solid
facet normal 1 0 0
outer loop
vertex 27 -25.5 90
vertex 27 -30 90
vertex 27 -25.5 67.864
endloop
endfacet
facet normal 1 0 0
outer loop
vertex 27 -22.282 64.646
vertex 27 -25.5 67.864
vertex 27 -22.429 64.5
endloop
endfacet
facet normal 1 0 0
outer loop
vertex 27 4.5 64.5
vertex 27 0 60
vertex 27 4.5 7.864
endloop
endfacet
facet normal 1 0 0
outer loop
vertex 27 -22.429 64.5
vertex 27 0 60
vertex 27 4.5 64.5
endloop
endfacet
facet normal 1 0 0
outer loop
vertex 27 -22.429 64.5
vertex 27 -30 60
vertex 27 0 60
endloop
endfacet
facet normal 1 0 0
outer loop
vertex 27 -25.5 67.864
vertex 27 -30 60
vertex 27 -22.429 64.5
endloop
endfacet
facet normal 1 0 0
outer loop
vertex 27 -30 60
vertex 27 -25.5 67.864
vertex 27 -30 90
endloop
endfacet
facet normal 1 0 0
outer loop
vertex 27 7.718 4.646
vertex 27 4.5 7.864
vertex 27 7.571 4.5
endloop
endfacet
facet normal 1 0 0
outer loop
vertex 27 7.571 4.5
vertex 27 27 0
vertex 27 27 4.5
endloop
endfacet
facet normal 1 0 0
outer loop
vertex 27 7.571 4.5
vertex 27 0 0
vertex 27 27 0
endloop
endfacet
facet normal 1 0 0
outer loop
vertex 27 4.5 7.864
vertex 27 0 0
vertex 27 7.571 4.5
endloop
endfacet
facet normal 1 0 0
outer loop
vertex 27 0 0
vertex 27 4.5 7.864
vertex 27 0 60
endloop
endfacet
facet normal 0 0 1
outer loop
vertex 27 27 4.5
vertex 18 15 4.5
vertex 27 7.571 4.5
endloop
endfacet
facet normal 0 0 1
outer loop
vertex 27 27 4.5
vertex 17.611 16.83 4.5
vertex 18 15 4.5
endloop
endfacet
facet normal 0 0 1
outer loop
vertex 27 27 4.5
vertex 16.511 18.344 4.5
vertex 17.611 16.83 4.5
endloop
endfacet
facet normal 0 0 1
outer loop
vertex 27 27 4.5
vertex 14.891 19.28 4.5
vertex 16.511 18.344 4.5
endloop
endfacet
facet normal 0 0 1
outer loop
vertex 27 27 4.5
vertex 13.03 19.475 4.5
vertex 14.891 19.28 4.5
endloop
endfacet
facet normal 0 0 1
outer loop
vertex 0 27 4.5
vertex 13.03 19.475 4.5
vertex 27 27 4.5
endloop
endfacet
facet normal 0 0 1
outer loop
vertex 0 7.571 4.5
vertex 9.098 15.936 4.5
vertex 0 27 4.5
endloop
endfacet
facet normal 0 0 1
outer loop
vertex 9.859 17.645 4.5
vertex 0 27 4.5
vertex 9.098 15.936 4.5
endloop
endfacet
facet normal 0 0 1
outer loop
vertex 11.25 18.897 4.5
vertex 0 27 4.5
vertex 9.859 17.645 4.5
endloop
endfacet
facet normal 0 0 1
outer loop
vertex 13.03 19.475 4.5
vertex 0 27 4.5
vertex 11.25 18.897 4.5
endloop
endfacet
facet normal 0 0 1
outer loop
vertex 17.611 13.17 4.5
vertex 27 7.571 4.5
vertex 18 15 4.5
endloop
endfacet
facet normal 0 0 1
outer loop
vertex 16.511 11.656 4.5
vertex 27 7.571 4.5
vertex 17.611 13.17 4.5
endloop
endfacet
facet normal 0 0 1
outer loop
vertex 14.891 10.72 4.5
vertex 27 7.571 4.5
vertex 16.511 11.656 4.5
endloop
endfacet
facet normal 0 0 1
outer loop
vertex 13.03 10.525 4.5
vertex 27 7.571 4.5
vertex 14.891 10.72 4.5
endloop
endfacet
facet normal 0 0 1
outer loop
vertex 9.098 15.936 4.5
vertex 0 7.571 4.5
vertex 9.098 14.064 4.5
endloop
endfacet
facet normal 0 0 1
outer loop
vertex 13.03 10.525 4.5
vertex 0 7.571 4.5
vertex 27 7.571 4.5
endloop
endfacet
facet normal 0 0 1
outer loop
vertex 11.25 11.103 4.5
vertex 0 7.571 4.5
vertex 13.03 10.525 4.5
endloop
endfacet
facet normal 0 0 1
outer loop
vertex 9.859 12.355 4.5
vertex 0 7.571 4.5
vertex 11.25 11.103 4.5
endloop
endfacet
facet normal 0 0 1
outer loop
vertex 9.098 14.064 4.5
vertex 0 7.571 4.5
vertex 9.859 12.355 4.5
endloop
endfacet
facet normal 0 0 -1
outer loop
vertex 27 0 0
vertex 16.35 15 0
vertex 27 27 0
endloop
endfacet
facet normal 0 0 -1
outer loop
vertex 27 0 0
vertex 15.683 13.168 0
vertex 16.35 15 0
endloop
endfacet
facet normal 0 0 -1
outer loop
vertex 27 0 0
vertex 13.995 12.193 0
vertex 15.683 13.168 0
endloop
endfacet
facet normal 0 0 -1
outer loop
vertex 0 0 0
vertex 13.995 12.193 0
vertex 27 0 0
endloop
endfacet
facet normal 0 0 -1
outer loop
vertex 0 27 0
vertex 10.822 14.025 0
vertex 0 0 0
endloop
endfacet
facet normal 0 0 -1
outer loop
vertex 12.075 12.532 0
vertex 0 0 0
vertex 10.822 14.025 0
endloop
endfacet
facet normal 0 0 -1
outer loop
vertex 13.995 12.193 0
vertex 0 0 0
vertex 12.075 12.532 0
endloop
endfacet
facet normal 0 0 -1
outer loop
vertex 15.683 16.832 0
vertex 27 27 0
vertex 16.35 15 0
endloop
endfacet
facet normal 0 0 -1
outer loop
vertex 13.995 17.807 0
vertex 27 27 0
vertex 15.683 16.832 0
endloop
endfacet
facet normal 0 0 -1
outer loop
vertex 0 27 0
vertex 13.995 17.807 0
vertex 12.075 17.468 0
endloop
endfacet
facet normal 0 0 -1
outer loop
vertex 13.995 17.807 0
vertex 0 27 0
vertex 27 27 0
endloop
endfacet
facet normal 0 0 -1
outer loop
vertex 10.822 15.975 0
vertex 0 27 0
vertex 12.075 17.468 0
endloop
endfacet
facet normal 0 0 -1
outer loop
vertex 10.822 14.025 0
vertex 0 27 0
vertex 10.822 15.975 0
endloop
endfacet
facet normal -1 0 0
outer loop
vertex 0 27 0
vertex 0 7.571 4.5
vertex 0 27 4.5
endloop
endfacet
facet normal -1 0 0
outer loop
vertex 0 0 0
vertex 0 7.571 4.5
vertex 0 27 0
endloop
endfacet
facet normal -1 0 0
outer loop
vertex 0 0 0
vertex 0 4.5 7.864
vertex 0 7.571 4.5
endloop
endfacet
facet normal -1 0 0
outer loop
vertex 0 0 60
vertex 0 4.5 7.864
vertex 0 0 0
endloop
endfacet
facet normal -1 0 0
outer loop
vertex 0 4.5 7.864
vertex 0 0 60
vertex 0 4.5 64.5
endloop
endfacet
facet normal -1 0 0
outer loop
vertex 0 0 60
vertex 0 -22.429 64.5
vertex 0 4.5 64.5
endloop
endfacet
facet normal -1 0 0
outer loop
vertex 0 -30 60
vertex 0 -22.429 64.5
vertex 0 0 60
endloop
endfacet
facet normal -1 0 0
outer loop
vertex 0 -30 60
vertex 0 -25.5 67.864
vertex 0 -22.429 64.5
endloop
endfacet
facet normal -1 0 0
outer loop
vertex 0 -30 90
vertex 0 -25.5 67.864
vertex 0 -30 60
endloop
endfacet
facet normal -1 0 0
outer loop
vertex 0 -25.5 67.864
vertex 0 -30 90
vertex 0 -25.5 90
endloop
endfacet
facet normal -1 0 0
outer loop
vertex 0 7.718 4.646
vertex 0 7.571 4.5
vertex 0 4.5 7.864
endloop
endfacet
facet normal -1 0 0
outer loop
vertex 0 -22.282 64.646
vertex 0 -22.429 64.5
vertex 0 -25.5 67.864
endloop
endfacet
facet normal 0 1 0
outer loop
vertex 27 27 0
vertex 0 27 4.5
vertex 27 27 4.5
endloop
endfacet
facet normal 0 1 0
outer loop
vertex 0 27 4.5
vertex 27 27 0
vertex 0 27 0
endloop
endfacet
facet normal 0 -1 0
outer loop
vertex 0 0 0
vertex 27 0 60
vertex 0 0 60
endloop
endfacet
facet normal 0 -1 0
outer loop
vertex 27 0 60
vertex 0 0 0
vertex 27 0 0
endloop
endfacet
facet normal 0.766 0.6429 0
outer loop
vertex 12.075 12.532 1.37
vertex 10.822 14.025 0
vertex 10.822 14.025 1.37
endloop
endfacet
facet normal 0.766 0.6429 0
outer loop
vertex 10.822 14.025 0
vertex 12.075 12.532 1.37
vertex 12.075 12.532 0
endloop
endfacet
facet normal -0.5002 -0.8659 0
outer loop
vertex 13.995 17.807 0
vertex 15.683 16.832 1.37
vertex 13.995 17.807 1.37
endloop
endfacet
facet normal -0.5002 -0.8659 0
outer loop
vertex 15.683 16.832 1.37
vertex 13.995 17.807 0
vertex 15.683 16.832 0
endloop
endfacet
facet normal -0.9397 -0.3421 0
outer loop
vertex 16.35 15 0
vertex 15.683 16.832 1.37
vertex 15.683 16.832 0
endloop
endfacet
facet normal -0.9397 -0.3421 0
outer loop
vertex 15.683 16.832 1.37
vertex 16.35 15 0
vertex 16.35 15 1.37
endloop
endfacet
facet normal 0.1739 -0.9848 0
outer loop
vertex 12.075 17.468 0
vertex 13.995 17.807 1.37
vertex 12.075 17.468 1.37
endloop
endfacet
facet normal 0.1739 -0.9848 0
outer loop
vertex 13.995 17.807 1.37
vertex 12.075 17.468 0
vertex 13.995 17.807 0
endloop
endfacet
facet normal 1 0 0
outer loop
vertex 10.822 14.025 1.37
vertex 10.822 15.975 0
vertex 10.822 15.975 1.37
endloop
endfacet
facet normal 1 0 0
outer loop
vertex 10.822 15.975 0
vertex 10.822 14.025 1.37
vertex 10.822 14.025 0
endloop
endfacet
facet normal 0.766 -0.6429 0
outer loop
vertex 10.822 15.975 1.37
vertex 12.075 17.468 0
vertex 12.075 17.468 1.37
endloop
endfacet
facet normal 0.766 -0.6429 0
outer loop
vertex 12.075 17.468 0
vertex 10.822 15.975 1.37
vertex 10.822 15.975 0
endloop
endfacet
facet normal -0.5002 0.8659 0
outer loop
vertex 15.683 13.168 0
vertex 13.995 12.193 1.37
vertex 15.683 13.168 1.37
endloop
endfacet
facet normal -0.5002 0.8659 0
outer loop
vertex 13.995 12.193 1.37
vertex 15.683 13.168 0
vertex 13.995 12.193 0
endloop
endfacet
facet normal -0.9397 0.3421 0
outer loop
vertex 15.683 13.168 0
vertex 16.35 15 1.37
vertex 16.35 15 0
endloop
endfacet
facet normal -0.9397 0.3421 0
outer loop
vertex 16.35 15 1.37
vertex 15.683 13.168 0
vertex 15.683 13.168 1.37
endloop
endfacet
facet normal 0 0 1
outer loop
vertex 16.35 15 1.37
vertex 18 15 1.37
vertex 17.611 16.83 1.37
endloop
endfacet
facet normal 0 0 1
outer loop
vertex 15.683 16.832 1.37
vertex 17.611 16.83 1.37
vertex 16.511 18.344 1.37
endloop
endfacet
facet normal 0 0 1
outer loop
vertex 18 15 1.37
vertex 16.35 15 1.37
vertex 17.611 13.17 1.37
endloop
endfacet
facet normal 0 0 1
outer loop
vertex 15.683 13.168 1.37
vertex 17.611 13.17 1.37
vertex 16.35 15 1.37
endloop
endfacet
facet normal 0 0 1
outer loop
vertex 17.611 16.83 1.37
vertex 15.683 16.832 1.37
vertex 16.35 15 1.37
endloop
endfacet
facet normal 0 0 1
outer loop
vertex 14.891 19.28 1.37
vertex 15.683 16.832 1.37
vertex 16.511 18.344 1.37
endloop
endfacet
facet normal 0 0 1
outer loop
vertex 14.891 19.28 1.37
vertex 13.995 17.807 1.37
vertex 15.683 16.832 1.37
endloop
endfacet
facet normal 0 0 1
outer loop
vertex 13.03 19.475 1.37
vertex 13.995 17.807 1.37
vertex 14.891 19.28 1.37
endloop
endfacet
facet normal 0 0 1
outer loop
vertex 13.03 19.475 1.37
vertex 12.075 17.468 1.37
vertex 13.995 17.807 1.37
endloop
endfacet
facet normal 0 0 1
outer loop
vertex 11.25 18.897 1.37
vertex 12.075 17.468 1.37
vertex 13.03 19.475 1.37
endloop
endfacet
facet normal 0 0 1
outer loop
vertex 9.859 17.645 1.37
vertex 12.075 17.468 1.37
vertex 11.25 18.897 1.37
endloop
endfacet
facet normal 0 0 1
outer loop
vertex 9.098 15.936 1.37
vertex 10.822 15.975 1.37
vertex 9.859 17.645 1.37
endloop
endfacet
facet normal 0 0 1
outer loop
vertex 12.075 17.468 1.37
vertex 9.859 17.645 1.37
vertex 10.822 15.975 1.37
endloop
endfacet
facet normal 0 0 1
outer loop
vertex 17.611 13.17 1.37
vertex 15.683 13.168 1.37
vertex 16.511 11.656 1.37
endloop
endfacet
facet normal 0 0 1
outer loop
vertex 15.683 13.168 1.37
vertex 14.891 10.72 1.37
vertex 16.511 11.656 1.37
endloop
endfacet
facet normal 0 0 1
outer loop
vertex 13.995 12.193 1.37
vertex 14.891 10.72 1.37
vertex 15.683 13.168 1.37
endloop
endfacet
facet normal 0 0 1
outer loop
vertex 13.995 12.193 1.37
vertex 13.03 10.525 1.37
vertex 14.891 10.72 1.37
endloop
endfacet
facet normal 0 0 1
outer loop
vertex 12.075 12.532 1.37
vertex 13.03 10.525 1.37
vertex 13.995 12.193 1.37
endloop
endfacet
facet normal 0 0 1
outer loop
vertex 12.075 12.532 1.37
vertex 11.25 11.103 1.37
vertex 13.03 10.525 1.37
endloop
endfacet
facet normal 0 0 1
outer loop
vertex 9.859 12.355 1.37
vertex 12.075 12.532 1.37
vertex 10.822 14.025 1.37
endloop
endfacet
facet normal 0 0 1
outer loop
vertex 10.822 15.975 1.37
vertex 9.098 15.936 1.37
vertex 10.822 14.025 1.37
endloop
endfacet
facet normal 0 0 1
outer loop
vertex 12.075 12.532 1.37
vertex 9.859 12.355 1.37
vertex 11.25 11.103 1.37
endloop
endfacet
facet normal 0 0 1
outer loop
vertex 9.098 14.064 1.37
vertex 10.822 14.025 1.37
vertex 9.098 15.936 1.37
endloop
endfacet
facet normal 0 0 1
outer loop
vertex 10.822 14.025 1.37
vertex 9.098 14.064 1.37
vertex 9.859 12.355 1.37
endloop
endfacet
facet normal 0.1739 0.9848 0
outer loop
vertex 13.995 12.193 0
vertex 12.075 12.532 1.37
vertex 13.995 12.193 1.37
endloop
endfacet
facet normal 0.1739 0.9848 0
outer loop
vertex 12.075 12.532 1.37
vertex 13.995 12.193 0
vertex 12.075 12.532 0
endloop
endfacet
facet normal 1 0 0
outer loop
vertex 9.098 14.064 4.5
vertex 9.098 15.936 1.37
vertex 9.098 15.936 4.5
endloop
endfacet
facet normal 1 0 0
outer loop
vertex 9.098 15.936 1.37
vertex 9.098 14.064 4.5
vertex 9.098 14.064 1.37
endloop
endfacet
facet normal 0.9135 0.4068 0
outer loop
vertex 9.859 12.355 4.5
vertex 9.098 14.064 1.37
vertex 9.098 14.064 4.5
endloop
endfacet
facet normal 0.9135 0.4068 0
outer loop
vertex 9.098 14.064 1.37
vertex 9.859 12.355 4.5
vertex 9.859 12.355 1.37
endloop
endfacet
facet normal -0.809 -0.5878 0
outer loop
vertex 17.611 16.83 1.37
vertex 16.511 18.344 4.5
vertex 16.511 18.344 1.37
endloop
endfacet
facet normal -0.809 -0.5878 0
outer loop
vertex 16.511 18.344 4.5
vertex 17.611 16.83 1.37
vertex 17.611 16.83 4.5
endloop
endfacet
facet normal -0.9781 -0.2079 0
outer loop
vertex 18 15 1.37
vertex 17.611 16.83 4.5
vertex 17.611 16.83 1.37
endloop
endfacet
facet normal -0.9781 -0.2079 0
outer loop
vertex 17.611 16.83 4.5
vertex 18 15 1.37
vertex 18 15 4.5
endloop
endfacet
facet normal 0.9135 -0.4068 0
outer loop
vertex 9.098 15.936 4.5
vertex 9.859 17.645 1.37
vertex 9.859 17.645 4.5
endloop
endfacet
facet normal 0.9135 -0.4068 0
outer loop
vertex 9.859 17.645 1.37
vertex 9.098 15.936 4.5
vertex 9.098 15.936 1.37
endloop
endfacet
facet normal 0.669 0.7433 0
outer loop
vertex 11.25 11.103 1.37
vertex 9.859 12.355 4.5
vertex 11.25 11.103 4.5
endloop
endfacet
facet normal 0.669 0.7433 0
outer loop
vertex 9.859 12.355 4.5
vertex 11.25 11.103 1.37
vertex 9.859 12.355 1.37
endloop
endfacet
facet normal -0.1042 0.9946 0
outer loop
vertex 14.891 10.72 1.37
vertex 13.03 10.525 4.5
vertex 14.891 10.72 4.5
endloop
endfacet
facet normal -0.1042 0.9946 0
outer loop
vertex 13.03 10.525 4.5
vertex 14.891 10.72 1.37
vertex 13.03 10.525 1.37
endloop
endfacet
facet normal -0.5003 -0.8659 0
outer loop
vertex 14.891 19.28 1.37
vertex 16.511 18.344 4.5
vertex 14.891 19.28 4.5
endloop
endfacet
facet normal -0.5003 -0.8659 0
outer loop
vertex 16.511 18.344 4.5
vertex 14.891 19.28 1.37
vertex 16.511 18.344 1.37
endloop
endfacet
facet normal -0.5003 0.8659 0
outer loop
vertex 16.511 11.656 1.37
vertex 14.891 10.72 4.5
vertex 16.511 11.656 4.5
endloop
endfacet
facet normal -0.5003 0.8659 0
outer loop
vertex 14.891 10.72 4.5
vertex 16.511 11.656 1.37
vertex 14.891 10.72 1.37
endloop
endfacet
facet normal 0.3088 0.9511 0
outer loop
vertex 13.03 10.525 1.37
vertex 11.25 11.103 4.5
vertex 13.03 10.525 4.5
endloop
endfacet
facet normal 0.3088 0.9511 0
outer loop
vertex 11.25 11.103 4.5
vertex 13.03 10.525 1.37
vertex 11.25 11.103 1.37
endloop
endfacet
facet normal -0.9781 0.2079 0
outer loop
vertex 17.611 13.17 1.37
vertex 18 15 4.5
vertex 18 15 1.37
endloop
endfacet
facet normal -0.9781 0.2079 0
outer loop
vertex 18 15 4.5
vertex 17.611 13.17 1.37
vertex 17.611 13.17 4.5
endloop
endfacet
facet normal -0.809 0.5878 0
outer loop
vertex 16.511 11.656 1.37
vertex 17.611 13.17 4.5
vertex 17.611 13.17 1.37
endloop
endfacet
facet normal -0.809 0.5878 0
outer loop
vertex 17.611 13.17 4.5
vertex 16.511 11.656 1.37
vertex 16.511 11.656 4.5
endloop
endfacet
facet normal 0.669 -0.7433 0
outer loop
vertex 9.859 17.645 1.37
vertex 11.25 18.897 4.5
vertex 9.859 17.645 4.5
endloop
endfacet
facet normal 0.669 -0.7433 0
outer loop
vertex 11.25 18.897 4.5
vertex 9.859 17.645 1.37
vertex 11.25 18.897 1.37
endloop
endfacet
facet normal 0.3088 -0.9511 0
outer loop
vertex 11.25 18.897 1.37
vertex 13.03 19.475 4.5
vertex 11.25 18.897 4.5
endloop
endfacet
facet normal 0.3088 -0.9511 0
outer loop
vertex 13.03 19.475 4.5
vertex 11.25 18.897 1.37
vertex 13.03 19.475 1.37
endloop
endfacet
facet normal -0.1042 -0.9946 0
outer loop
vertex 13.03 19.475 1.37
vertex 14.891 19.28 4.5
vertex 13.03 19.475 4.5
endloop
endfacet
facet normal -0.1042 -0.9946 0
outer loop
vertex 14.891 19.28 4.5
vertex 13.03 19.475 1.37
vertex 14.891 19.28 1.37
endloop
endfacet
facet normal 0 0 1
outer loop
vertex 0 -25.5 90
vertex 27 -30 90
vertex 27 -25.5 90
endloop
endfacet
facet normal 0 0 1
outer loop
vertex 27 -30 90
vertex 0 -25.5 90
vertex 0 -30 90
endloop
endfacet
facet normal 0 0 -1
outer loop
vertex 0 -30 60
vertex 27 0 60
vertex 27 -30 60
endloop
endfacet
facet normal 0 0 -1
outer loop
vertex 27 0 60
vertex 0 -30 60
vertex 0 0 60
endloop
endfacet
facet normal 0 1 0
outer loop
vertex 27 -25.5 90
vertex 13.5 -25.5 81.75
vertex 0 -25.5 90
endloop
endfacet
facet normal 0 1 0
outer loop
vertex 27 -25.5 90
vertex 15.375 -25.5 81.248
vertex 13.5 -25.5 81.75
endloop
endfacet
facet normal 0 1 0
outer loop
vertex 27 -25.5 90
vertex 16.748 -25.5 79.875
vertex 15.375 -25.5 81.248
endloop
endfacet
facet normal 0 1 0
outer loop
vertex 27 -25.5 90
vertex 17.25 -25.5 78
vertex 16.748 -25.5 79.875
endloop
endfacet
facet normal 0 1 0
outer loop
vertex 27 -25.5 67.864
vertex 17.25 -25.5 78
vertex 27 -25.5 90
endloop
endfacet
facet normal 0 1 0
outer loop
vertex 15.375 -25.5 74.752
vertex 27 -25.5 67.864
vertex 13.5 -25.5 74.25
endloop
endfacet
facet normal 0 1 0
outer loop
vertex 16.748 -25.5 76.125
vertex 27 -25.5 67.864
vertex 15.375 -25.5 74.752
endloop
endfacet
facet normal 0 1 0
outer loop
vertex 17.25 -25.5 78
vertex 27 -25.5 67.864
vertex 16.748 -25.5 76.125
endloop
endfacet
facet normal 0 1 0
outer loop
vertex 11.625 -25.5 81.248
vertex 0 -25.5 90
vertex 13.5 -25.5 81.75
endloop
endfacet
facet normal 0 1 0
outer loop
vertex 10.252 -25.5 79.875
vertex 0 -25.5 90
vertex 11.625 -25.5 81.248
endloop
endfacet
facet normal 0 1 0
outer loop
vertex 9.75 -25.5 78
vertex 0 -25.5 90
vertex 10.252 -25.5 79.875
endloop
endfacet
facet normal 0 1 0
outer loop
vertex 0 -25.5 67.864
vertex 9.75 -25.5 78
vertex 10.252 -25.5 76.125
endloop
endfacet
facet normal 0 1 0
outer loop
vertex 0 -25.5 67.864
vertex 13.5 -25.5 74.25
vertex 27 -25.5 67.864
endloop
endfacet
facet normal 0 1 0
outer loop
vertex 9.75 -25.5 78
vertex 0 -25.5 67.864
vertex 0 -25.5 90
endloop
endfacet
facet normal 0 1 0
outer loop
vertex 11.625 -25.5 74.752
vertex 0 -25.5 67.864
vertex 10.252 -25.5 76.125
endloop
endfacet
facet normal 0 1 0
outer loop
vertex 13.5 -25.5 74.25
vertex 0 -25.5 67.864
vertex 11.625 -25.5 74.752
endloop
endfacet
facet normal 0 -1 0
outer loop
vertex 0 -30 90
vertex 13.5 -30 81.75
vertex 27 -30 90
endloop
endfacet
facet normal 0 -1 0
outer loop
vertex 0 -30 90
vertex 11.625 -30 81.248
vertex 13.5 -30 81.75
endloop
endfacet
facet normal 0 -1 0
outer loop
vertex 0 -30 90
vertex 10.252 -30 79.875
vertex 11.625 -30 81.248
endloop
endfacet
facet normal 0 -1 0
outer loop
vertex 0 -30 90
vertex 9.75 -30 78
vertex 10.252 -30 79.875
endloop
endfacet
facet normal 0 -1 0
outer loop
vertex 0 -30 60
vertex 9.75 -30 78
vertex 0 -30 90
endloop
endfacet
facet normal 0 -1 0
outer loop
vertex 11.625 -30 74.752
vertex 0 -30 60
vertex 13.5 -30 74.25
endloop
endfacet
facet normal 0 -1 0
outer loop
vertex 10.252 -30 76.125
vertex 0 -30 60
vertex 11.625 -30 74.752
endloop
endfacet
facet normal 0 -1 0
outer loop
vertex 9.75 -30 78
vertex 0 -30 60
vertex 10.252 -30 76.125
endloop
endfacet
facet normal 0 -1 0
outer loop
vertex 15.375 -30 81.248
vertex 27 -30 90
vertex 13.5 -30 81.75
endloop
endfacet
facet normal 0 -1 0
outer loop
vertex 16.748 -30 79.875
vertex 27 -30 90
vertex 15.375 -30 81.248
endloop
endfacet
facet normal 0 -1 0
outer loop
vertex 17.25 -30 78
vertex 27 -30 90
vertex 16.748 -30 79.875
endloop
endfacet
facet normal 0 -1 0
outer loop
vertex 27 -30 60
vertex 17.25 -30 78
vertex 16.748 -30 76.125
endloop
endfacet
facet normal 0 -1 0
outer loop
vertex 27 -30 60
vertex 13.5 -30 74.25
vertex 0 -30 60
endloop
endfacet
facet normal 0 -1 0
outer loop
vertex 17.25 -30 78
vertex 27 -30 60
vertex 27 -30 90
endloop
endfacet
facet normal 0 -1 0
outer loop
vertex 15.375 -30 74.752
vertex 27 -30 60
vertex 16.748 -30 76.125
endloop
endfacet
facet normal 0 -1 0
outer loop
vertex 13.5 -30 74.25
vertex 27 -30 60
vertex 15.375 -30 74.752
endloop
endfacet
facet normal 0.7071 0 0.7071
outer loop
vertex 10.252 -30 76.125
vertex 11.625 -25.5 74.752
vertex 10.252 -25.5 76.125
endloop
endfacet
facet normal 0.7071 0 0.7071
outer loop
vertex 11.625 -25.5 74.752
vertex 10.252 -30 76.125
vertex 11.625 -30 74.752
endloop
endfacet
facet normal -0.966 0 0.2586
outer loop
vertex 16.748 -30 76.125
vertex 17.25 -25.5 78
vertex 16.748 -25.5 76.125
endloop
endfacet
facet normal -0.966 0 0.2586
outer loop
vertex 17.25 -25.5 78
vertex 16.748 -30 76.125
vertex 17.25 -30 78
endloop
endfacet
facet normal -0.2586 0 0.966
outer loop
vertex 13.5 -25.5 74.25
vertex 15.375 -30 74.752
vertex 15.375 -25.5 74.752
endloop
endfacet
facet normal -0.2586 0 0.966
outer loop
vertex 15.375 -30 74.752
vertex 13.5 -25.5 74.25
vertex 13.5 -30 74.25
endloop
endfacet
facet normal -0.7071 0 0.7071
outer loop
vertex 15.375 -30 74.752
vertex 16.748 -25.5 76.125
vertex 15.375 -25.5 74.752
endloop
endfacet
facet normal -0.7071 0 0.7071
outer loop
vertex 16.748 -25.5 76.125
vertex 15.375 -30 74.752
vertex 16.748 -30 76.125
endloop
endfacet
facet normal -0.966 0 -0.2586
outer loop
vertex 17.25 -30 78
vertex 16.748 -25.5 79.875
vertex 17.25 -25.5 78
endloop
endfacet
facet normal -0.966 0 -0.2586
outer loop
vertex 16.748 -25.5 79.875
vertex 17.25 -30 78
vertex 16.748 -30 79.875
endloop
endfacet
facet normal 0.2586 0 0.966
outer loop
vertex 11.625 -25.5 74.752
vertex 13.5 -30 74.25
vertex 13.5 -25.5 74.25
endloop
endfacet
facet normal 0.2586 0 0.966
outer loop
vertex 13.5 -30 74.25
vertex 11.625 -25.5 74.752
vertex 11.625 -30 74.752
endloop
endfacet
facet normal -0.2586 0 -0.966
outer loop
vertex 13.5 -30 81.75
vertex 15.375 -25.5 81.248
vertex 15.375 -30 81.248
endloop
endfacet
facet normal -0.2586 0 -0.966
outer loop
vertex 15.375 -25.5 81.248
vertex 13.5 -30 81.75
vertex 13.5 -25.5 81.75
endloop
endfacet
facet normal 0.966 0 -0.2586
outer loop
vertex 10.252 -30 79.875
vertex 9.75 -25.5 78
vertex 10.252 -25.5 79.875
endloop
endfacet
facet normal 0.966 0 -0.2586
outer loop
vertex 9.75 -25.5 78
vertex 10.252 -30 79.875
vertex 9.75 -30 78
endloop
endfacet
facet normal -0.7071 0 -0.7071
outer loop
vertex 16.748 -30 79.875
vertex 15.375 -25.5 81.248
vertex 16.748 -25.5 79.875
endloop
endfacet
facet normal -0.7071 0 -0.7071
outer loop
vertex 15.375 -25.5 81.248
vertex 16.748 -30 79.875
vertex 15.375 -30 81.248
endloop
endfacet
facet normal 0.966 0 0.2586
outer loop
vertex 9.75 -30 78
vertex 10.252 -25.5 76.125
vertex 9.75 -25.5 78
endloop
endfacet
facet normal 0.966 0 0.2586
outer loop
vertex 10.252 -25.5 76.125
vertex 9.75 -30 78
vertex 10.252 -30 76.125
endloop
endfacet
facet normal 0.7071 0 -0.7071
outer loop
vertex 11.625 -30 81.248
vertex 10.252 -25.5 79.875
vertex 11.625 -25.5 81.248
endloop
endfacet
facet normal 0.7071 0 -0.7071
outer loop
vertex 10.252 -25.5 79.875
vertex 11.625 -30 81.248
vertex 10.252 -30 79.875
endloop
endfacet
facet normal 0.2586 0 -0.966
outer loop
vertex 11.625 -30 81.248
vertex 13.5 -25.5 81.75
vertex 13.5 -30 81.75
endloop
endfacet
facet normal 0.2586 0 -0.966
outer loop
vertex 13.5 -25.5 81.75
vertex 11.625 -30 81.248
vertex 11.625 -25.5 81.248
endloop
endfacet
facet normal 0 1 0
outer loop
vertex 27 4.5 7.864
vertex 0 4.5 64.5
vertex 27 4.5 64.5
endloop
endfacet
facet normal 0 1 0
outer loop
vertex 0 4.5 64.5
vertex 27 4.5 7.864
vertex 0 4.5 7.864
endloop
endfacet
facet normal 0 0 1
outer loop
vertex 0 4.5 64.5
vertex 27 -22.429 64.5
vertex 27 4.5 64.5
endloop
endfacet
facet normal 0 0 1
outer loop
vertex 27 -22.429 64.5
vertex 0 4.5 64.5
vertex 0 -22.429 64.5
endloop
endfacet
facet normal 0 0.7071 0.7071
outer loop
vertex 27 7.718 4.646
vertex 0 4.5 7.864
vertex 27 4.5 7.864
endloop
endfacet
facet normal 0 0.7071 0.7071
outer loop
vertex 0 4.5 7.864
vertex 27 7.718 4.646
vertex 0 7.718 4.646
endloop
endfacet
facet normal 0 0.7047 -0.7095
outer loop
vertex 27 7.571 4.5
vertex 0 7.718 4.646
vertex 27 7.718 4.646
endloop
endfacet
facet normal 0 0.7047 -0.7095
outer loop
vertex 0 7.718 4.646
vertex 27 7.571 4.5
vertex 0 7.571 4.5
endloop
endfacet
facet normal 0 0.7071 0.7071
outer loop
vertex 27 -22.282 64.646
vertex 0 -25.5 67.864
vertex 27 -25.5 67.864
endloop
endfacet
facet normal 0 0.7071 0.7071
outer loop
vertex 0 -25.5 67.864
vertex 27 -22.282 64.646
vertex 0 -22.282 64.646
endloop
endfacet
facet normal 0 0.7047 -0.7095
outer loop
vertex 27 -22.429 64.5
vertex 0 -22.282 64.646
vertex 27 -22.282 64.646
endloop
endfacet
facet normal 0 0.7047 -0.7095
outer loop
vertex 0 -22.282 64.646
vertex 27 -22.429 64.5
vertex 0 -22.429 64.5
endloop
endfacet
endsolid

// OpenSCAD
width = 27;
thickness = 4.5;

difference() {
    cube([width, width, thickness]);
    translate([13.5,15,0])
    cylinder(h=1.37, r1=2.85, r2=2.85);
    translate([13.5,15,1.37])
    cylinder(h=4.5, r1=4.5, r2=4.5);
}

cube([width, thickness, 60]);

translate([0,-25.5,60])
cube([width, 30, thickness]);

difference() {
    translate([0,-30,60])
    cube([width, thickness, 30]);
    translate([13.5,-25,78])
    rotate([90, 90, 0])
    cylinder(h=thickness + 1, r1=3.75, r2=3.75);
}

translate([0,1,5])
rotate([-45, 0, 0])
cube([width, 5, thickness]);

translate([0,-29,65])
rotate([-45, 0, 0])
cube([width, 5, thickness]);
